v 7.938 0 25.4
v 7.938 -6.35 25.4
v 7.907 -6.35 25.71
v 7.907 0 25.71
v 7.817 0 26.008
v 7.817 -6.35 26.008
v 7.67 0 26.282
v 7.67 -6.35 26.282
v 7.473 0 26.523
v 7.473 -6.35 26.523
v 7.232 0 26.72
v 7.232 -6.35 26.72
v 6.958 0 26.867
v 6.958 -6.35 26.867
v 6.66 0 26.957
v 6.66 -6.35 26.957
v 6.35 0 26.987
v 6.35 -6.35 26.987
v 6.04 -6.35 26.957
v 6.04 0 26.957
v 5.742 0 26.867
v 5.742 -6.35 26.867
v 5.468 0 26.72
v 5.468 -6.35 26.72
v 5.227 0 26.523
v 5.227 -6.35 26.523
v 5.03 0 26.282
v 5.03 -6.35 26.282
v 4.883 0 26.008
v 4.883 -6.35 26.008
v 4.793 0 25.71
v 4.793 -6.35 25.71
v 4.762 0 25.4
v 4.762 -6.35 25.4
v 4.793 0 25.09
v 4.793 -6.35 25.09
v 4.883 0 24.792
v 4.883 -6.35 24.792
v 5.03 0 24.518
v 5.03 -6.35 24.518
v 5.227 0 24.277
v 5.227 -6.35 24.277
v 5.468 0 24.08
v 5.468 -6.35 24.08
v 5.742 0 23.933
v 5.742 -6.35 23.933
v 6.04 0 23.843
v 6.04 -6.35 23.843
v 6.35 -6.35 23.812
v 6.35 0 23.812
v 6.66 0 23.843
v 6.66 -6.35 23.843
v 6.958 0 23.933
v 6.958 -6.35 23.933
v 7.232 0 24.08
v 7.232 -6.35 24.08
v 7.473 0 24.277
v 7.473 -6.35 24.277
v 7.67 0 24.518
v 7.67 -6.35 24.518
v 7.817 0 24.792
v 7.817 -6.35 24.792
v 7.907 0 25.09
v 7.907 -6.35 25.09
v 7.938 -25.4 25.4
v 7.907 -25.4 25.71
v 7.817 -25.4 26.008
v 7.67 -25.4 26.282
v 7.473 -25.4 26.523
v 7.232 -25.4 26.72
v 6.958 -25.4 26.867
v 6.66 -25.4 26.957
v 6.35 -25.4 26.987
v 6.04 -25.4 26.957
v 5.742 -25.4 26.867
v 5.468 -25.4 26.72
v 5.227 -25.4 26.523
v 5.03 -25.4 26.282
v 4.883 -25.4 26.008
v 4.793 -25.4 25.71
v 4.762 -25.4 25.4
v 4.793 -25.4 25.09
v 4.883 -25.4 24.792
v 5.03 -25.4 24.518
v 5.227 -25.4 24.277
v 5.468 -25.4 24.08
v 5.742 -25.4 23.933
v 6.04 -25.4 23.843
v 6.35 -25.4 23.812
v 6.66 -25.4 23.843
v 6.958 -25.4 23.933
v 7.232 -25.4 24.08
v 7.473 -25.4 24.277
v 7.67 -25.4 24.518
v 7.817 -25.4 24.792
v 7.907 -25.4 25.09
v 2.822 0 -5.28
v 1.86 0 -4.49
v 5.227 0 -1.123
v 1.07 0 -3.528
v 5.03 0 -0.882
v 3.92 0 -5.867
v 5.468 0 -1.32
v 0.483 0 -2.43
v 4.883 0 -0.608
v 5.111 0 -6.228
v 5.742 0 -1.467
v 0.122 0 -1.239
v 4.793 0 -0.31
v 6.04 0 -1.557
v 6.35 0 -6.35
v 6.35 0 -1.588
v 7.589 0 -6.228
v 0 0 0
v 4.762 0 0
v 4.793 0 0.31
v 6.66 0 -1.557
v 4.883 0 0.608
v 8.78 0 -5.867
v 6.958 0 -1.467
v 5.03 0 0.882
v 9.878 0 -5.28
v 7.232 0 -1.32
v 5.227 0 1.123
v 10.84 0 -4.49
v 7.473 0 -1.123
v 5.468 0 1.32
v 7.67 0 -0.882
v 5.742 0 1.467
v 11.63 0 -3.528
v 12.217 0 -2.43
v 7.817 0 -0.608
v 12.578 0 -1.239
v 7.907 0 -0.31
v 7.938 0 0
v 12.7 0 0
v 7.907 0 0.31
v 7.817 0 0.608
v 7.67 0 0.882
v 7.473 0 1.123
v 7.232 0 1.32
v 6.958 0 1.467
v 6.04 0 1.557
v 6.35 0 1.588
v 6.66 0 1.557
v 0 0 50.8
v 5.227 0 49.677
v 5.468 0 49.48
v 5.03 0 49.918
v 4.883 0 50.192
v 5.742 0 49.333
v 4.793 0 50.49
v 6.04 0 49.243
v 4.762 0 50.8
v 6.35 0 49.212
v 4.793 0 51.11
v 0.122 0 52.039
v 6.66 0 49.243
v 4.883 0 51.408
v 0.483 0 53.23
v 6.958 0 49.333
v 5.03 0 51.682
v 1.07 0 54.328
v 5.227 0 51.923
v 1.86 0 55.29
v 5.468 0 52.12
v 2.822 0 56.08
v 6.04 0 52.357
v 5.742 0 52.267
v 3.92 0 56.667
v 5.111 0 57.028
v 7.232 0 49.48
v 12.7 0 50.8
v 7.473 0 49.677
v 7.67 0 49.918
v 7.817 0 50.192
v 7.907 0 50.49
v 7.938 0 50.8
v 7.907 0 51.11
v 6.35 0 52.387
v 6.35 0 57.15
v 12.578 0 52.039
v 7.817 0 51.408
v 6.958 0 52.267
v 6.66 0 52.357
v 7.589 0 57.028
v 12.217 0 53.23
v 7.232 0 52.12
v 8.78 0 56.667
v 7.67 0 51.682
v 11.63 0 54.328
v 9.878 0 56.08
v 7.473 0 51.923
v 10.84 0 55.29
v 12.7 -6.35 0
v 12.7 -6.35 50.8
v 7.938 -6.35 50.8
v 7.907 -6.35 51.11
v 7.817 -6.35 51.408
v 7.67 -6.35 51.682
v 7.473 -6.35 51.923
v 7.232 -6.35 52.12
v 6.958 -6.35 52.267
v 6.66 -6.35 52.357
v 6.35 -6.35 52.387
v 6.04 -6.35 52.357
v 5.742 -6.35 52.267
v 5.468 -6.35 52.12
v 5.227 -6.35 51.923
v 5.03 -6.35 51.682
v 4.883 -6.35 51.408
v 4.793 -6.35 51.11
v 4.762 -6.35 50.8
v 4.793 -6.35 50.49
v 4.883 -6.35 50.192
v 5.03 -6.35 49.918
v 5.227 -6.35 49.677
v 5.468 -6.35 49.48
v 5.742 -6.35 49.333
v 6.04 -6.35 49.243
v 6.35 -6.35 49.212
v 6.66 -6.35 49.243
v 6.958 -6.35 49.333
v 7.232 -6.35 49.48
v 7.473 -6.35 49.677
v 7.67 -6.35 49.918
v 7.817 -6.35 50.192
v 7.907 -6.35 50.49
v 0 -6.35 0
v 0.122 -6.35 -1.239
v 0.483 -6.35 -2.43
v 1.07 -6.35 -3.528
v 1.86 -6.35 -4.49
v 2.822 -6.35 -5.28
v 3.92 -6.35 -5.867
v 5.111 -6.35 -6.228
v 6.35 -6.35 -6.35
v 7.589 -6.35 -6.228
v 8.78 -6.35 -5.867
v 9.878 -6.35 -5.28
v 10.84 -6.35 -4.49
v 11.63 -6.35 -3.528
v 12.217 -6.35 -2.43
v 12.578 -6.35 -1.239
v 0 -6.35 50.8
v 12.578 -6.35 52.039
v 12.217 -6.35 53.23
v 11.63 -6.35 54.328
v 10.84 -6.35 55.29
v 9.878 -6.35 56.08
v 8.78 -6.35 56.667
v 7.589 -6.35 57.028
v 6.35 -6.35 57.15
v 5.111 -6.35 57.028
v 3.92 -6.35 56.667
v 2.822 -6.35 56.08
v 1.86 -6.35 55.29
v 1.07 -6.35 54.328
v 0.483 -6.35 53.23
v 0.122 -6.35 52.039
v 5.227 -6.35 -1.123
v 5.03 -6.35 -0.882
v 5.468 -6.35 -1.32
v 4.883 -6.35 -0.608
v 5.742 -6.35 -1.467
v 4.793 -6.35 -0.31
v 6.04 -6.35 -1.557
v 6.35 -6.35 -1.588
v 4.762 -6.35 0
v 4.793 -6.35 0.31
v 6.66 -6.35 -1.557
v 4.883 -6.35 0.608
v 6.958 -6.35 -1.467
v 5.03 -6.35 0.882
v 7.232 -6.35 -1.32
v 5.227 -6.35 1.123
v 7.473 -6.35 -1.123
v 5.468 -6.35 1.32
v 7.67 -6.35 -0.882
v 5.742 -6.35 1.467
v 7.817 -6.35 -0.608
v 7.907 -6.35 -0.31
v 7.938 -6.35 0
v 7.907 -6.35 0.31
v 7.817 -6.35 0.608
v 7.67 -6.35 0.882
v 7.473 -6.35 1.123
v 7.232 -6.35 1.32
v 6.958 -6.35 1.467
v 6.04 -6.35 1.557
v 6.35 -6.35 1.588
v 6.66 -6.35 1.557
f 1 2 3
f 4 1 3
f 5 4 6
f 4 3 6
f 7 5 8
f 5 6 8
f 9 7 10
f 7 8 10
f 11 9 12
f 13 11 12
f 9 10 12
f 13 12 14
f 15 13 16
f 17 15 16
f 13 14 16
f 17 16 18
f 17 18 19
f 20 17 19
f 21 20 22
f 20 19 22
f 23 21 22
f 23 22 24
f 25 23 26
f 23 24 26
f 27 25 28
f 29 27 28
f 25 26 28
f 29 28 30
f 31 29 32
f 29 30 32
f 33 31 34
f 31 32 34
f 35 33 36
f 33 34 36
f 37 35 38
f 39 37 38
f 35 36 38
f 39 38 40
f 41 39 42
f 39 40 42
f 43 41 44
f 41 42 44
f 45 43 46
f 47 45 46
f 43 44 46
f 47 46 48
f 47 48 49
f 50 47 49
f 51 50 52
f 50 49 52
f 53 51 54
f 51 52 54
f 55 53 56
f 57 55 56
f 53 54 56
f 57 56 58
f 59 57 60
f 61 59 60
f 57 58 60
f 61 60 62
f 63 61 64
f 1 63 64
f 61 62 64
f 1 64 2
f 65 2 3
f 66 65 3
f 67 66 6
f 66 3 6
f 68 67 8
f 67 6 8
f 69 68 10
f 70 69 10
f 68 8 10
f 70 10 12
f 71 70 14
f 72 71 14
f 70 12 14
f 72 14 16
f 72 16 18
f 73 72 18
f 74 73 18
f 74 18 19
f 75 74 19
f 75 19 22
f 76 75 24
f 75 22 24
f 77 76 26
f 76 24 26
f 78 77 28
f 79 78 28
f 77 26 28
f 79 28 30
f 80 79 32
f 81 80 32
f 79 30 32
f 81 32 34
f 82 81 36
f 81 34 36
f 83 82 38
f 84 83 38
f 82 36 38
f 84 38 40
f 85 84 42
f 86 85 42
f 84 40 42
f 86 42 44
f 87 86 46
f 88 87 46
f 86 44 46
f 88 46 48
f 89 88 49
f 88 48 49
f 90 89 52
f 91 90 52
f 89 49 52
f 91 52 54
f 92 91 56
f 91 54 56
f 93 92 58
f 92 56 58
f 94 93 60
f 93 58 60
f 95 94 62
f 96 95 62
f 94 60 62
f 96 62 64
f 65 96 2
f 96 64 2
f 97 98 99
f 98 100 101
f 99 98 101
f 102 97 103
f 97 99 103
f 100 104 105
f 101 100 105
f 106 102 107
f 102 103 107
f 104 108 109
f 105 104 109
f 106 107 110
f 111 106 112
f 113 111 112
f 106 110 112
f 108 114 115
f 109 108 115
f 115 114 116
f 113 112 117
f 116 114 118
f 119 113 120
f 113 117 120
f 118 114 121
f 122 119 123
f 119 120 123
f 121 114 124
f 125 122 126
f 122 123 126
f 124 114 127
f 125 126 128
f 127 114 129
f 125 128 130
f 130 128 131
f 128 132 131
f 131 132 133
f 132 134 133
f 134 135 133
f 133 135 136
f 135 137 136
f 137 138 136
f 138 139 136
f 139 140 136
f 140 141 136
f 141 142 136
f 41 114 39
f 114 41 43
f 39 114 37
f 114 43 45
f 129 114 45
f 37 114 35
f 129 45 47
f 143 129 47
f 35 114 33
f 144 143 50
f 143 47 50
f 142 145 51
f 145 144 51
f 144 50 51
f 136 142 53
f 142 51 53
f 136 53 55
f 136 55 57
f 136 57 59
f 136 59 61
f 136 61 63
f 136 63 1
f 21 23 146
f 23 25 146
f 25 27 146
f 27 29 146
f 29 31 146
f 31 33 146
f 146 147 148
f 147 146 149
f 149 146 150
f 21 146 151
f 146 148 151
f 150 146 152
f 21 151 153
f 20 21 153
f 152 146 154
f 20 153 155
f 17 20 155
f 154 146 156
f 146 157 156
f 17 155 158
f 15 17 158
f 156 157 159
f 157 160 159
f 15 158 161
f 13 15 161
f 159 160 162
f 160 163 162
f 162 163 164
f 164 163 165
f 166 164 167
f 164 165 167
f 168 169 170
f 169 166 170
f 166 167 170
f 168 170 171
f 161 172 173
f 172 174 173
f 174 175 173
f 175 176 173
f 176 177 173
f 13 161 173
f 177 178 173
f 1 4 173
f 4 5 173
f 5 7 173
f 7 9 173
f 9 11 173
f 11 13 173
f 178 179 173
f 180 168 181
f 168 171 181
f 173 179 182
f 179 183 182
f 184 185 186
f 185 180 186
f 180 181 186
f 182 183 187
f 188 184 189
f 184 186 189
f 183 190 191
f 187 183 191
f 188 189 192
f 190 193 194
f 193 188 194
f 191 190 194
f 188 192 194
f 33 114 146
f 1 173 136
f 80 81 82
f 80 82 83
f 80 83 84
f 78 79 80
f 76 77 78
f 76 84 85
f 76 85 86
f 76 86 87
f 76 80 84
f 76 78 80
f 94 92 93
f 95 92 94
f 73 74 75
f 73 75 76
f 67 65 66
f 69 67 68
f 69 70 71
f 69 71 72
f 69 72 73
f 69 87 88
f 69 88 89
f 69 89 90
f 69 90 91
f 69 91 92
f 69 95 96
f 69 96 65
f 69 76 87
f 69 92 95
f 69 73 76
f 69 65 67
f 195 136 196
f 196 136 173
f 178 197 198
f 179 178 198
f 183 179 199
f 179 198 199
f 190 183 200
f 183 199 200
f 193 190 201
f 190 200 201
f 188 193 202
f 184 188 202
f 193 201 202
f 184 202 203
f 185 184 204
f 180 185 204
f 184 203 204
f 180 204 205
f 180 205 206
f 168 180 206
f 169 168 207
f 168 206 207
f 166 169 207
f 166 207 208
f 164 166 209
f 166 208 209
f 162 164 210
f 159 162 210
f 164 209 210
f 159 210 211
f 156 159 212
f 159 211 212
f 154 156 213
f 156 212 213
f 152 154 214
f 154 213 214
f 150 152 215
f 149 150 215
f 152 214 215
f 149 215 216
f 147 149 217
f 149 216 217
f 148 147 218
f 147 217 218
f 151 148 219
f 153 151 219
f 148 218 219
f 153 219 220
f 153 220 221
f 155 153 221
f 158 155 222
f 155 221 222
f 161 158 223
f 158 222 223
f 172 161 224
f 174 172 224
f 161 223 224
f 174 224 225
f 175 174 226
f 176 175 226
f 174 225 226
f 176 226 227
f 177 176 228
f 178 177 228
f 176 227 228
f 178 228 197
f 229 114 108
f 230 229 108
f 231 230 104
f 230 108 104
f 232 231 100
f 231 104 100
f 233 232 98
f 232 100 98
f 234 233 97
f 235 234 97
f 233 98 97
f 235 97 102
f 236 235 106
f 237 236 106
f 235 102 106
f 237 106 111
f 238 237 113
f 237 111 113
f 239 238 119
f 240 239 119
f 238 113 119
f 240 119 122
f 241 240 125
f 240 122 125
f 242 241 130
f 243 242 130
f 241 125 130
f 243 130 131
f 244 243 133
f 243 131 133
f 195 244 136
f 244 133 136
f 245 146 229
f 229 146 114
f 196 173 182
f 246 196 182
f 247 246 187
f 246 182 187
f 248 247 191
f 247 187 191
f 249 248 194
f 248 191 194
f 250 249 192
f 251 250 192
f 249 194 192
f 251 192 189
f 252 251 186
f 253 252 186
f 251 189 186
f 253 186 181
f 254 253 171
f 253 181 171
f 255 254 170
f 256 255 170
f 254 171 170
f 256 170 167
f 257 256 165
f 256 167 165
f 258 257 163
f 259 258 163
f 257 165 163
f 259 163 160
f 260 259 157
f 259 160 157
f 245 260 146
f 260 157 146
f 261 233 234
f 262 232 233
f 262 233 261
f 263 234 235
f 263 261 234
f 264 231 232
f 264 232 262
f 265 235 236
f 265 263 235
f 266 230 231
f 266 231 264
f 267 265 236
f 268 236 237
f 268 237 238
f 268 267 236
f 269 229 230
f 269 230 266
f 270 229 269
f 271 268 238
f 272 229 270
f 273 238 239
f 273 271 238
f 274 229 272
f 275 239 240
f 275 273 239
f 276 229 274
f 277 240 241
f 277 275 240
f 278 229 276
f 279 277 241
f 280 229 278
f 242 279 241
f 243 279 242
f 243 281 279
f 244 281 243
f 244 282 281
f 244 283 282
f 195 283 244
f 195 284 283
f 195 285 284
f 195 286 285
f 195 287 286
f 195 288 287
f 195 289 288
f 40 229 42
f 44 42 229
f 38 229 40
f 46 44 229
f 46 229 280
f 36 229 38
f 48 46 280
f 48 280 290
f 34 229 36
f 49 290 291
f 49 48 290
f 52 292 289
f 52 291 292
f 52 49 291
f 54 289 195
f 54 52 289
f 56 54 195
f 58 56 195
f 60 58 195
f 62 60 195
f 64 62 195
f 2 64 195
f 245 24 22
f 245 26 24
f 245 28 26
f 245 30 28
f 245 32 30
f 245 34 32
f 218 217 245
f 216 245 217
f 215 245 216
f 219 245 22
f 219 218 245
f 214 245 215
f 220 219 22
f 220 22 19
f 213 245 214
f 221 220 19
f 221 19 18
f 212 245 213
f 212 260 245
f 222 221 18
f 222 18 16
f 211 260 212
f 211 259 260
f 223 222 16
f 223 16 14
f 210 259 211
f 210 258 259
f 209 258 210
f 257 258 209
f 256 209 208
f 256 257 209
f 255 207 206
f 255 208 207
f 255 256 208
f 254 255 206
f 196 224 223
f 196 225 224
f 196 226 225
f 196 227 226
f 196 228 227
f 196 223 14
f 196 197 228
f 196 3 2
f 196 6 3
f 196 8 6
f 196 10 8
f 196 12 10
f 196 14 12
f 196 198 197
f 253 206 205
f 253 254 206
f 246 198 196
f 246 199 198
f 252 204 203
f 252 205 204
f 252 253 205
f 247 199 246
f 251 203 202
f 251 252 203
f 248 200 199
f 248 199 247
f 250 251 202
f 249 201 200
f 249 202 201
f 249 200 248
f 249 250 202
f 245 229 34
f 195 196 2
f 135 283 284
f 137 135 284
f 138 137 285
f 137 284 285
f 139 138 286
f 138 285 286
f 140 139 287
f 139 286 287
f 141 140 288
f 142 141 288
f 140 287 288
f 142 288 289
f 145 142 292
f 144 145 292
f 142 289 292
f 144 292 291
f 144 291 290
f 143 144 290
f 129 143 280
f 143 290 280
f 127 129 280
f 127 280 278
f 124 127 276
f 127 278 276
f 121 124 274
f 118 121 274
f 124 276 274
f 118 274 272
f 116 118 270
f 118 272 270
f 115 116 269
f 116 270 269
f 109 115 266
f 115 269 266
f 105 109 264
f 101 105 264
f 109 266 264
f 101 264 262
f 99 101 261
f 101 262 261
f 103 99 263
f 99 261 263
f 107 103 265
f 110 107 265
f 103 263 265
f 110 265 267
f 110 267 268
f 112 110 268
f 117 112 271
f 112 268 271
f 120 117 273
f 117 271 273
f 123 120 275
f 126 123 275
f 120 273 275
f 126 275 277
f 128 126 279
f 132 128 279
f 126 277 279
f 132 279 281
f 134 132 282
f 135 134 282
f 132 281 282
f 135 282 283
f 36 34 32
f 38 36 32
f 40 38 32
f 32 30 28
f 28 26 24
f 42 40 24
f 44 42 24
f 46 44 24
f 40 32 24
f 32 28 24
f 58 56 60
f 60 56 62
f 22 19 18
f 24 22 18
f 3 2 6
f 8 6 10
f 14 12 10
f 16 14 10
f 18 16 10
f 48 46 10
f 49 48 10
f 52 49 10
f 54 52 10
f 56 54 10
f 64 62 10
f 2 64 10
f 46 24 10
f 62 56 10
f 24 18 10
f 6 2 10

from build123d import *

# Parameters (mm, degrees)
F1_DEPTH = 6.35
F2_R     = 1.5875
F3_DEPTH = 6.35
F4_R     = 1.5875
F5_DEPTH = 19.05


with BuildPart() as f1:
    # F0 (on Front) → F1 (new body)
    with BuildSketch(Plane.XZ):
        with BuildLine():
            Line((0, 50.8), (0, 0))
            ThreePointArc((0, 0), (6.35, -6.35), (12.7, 0))
            Line((12.7, 0), (12.7, 50.8))
            ThreePointArc((12.7, 50.8), (6.35, 57.15), (0, 50.8))
        make_face()
    extrude(amount=F1_DEPTH)

    # F2 (on face) → F3 (cut, through all)
    with BuildSketch(Plane.XZ.offset(6.35)):
        with Locations((6.35, 50.8)):
            Circle(F2_R)
        with Locations((6.35, 0)):
            Circle(F2_R)
        with Locations((6.35, 25.4)):
            Circle(F2_R)
    extrude(amount=-F3_DEPTH, mode=Mode.SUBTRACT)


with BuildPart() as f5:
    # F4 (on face) → F5 (new body)
    with BuildSketch(Plane.XZ.offset(6.35)):
        with Locations((6.35, 25.4)):
            Circle(F4_R)
    extrude(amount=F5_DEPTH)


solid = Compound([f1.part, f5.part])
